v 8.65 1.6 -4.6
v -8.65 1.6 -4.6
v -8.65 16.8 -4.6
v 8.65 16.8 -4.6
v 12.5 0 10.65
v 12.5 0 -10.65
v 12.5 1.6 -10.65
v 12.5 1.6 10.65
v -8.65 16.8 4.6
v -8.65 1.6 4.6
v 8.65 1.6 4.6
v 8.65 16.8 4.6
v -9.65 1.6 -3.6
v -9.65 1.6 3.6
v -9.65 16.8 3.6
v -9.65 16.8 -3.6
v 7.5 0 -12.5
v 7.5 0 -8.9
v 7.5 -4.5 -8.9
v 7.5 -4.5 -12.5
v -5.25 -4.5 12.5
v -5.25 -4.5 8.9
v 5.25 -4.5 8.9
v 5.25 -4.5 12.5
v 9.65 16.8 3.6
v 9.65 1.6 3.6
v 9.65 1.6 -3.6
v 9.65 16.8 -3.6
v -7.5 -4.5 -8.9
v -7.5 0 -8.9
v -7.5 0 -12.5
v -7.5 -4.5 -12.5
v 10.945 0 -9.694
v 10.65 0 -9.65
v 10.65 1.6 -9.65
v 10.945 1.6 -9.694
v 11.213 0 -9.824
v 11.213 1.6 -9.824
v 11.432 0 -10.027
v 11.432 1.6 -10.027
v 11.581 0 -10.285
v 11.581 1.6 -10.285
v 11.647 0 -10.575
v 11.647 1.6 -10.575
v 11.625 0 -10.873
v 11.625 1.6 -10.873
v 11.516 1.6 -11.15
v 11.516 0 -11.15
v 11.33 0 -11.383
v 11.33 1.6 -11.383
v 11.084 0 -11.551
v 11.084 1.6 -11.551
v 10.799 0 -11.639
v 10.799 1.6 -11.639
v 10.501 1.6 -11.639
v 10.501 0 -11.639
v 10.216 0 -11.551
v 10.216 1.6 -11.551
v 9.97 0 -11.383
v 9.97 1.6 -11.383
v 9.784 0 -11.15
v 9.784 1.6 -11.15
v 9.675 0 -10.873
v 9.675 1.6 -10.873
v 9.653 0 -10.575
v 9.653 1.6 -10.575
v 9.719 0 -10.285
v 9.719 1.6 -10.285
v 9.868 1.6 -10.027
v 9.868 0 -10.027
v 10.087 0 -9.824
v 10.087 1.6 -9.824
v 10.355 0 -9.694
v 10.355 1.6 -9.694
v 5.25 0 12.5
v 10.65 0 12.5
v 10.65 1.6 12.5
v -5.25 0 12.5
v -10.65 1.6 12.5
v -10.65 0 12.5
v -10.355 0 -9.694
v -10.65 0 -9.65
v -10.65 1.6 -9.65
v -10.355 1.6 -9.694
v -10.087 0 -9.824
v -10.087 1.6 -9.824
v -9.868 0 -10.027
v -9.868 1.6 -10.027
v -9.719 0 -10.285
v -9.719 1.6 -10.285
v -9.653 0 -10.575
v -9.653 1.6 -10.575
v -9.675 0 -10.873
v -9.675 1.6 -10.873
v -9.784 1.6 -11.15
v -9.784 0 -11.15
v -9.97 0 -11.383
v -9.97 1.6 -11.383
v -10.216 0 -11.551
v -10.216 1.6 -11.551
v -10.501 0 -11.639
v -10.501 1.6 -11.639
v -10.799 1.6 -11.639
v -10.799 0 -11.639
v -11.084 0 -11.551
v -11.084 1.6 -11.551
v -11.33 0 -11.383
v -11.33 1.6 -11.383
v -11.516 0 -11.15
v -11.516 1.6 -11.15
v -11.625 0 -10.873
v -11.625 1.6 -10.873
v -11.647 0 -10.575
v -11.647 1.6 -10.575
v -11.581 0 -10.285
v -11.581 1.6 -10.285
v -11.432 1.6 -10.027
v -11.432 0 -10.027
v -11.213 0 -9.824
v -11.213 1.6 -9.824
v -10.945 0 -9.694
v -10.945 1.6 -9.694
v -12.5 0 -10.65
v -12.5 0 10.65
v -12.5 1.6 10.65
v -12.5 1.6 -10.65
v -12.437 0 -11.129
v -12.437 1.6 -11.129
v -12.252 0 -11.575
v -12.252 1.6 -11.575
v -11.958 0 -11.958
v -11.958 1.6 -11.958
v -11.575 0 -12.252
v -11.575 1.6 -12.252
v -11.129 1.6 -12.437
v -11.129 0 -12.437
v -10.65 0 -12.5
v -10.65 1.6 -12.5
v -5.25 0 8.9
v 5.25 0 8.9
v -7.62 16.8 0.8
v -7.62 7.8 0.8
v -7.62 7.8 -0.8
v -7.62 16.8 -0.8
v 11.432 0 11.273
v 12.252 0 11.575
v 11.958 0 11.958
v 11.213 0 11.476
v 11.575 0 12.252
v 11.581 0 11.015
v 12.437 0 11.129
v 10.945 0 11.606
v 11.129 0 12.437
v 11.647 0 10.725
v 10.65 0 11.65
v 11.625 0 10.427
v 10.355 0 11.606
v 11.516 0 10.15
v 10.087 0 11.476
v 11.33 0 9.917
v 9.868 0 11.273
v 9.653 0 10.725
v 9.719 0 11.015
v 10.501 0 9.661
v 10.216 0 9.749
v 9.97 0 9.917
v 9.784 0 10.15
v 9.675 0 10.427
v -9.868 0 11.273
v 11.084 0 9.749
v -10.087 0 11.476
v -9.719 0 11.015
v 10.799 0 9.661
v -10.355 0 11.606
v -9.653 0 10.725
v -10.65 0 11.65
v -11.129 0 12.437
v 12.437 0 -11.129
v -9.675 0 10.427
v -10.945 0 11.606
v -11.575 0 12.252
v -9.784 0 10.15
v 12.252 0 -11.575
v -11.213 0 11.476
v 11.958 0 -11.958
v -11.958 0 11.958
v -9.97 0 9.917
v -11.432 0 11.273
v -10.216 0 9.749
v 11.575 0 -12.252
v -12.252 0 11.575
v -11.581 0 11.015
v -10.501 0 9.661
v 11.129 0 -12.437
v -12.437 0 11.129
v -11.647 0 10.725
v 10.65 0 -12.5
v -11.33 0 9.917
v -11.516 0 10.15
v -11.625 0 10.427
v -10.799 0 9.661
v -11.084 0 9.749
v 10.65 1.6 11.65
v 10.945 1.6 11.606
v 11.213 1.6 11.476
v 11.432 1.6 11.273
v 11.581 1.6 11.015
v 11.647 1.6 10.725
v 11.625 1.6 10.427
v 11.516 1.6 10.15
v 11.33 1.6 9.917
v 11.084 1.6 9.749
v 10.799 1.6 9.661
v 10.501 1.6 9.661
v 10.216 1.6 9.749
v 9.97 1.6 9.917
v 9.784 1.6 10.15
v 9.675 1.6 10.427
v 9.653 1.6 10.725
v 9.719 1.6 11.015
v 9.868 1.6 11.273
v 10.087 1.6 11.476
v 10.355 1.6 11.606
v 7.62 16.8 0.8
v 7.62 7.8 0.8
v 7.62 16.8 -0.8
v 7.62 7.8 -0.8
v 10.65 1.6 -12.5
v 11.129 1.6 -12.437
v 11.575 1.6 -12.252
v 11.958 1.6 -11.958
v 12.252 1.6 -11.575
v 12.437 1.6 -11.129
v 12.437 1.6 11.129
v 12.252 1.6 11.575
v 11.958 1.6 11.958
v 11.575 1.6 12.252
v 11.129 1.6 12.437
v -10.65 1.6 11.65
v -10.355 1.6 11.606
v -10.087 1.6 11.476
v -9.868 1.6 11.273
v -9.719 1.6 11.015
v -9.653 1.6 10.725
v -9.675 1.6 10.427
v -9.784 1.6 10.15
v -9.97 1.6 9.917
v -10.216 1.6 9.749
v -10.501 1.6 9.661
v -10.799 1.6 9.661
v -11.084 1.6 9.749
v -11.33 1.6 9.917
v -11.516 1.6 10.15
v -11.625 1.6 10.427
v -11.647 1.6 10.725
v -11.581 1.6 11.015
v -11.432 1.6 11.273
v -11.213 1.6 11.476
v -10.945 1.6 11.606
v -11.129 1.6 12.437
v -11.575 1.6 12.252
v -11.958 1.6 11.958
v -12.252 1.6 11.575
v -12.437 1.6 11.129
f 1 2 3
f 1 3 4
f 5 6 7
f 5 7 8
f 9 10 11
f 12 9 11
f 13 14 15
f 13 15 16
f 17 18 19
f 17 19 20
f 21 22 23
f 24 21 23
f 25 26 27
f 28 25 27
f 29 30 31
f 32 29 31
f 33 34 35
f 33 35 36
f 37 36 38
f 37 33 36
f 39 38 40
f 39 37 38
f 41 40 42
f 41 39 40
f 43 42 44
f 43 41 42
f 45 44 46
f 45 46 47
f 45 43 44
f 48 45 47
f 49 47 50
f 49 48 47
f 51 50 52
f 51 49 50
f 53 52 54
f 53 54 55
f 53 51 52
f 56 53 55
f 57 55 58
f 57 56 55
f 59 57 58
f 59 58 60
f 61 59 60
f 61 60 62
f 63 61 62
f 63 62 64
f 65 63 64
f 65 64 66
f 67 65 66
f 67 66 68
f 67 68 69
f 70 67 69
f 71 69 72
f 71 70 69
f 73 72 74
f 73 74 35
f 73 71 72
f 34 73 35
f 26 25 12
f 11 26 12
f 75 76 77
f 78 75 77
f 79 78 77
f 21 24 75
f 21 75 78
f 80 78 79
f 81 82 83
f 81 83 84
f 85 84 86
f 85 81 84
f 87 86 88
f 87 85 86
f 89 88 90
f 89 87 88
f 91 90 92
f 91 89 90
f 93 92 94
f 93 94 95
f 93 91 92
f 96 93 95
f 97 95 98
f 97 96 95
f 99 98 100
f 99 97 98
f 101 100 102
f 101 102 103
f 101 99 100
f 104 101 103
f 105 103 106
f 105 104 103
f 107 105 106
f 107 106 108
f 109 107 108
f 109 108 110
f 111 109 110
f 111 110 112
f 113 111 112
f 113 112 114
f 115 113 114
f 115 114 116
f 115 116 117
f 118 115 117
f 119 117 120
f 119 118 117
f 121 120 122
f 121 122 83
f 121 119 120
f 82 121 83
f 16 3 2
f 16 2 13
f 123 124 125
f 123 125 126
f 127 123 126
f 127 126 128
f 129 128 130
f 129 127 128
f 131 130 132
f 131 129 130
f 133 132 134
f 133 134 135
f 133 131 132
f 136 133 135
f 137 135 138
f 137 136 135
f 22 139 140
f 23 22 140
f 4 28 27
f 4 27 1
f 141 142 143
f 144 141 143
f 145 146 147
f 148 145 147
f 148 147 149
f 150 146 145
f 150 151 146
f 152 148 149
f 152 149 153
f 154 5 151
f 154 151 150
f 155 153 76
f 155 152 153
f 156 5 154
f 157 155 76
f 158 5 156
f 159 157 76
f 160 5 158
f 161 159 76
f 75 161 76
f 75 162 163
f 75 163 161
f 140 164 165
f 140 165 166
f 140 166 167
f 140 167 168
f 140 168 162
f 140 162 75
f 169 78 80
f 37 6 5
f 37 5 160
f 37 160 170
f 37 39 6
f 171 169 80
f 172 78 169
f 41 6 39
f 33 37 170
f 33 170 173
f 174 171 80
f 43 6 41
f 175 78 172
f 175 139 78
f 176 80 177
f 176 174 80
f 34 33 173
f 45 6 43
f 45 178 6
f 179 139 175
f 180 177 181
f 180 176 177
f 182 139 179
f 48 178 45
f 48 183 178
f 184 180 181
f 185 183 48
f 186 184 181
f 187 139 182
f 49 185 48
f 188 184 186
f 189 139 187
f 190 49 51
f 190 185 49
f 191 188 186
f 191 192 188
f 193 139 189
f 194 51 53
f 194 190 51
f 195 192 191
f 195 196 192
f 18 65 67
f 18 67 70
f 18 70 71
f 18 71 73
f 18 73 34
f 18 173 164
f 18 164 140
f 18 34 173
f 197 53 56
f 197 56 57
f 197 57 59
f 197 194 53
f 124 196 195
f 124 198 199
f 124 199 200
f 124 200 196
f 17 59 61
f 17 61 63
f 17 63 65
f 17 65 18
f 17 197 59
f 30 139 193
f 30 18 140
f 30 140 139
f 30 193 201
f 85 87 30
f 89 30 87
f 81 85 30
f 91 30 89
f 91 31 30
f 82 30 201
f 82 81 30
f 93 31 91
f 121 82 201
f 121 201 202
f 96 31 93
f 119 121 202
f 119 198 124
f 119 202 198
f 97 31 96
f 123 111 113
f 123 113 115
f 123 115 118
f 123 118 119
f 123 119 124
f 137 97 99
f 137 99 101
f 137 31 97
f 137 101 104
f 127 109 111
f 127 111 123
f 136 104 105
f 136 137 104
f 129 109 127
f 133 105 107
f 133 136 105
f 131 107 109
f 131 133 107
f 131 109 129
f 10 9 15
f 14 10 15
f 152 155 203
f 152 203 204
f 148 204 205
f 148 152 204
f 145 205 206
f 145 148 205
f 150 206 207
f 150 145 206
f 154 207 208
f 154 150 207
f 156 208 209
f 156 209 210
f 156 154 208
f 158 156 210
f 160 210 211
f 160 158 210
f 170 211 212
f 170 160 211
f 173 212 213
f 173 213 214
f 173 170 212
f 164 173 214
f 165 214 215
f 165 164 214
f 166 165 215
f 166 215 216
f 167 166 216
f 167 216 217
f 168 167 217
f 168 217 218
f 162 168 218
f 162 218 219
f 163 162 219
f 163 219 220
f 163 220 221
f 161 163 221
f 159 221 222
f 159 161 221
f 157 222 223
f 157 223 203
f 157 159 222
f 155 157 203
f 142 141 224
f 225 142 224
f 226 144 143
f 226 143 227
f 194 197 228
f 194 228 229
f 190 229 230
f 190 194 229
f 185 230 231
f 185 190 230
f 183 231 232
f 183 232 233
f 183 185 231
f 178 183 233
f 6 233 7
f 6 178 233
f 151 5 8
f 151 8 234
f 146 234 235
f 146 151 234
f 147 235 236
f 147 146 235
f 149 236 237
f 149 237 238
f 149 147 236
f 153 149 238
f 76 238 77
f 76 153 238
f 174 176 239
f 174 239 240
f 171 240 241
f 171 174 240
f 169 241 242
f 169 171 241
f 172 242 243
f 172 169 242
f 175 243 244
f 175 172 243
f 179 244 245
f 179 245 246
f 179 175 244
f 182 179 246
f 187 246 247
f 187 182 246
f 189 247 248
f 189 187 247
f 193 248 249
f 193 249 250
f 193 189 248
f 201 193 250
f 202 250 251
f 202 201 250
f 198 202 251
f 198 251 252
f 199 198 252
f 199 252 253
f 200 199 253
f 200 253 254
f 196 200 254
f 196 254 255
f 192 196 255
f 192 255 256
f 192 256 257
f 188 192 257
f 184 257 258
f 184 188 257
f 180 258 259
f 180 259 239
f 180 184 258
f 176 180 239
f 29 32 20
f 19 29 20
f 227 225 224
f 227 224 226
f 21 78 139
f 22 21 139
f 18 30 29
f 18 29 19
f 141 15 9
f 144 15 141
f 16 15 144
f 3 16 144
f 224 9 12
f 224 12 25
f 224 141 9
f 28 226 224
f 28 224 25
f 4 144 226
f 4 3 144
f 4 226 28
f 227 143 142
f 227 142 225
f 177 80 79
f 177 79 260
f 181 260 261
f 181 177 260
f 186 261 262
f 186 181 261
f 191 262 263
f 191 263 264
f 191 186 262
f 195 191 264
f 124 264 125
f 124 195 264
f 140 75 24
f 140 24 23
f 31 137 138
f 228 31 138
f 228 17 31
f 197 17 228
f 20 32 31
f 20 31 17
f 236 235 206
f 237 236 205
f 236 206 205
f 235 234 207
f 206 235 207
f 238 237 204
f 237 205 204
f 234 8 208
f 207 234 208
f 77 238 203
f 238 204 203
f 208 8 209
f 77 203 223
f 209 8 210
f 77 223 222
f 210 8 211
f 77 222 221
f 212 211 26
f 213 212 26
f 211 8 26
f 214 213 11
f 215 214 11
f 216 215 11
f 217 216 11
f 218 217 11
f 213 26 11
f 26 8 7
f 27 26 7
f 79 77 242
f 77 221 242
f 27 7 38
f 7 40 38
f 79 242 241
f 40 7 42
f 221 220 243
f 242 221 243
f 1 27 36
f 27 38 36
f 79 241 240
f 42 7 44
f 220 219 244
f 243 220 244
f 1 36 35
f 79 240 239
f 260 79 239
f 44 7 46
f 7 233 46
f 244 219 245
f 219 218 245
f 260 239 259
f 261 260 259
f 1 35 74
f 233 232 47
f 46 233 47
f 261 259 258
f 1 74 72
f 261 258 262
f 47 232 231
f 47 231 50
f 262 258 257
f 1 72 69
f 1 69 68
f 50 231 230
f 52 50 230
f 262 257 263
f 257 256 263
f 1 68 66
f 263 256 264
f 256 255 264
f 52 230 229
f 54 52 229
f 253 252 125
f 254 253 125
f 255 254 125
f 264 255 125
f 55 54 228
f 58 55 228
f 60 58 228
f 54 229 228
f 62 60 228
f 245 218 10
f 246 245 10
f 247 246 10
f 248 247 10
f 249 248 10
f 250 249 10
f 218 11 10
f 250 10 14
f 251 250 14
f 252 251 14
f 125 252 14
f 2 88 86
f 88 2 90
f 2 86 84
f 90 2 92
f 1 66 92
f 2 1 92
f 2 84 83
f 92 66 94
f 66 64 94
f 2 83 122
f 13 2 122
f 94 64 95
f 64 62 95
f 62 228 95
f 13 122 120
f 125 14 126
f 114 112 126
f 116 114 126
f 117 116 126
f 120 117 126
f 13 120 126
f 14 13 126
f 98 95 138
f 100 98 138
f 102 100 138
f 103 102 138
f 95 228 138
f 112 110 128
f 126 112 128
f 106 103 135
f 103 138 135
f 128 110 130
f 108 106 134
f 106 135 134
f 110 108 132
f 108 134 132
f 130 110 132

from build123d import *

# Parameters (mm, degrees)
SKETCH_2_R          = 1
EXTRUDE_3_DEPTH     = 1.6
EXTRUDE_START       = 1.6
SKETCH_3_W          = 19.3
SKETCH_3_H          = 9.2
EXTRUDE_4_DEPTH     = 15.2
CUT_EXTRUDE_START   = 16.8
SKETCH_4_W          = 15.24
SKETCH_4_H          = 1.6
CUT_EXTRUDE_1_DEPTH = 9
CUT_EXTRUDE_2_DEPTH = 15.2
SKETCH_6_W          = 10.5
SKETCH_6_H          = 3.6
SKETCH_6_W_2        = 15
EXTRUDE_5_DEPTH     = 4.5


with BuildPart() as part:
    # 草图2 → 凸台-拉伸3 (new body)
    with BuildSketch(Plane(origin=(0, 0, 0), x_dir=(1, 0, 0), z_dir=(0, 1, 0))):
        with BuildLine():
            Line((-10.65, 12.5), (10.65, 12.5))
            ThreePointArc((10.65, 12.5), (11.958147545, 11.958147545), (12.5, 10.65))
            Line((12.5, 10.65), (12.5, -10.65))
            ThreePointArc((12.5, -10.65), (11.958147545, -11.958147545), (10.65, -12.5))
            Line((10.65, -12.5), (-10.65, -12.5))
            ThreePointArc((-10.65, -12.5), (-11.958147545, -11.958147545), (-12.5, -10.65))
            Line((-12.5, -10.65), (-12.5, 10.65))
            ThreePointArc((-12.5, 10.65), (-11.958147545, 11.958147545), (-10.65, 12.5))
        make_face()
        with Locations(Location((-10.65, 10.65, 0), (0, 0, 270))):
            Circle(SKETCH_2_R, mode=Mode.SUBTRACT)
        with Locations(Location((10.65, 10.65, 0), (0, 0, 270))):
            Circle(SKETCH_2_R, mode=Mode.SUBTRACT)
        with Locations(Location((-10.65, -10.65, 0), (0, 0, 270))):
            Circle(SKETCH_2_R, mode=Mode.SUBTRACT)
        with Locations(Location((10.65, -10.65, 0), (0, 0, 270))):
            Circle(SKETCH_2_R, mode=Mode.SUBTRACT)
    extrude(amount=EXTRUDE_3_DEPTH)

    # 草图3 → 凸台-拉伸4 (add)
    with BuildSketch(Plane(origin=(0, 0, 0), x_dir=(1, 0, 0), z_dir=(0, 1, 0)).offset(EXTRUDE_START)):
        Rectangle(SKETCH_3_W, SKETCH_3_H)
    extrude(amount=EXTRUDE_4_DEPTH)

    # 草图4 → 切除-拉伸1 (cut)
    with BuildSketch(Plane(origin=(0, 0, 0), x_dir=(1, 0, 0), z_dir=(0, 1, 0)).offset(CUT_EXTRUDE_START)):
        Rectangle(SKETCH_4_W, SKETCH_4_H)
    extrude(amount=-CUT_EXTRUDE_1_DEPTH, mode=Mode.SUBTRACT)

    # 草图5 → 切除-拉伸2 (cut)
    with BuildSketch(Plane(origin=(0, 0, 0), x_dir=(1, 0, 0), z_dir=(0, 1, 0)).offset(CUT_EXTRUDE_START)):
        Polygon((9.65, 4.6), (9.65, 3.6), (8.65, 4.6), align=None)
        Polygon((9.65, -4.6), (9.65, -3.6), (8.65, -4.6), align=None)
        Polygon((-9.65, -4.6), (-8.65, -4.6), (-9.65, -3.6), align=None)
        Polygon((-9.65, 4.6), (-8.65, 4.6), (-9.65, 3.6), align=None)
    extrude(amount=-CUT_EXTRUDE_2_DEPTH, mode=Mode.SUBTRACT)

    # 草图6 → 凸台-拉伸5 (add)
    with BuildSketch(Plane(origin=(0, 0, 0), x_dir=(1, 0, 0), z_dir=(0, 1, 0))):
        with Locations((0, -10.7)):
            Rectangle(SKETCH_6_W, SKETCH_6_H)
        with Locations((0, 10.7)):
            Rectangle(SKETCH_6_W_2, SKETCH_6_H)
    extrude(amount=-EXTRUDE_5_DEPTH)


solid = part.part
